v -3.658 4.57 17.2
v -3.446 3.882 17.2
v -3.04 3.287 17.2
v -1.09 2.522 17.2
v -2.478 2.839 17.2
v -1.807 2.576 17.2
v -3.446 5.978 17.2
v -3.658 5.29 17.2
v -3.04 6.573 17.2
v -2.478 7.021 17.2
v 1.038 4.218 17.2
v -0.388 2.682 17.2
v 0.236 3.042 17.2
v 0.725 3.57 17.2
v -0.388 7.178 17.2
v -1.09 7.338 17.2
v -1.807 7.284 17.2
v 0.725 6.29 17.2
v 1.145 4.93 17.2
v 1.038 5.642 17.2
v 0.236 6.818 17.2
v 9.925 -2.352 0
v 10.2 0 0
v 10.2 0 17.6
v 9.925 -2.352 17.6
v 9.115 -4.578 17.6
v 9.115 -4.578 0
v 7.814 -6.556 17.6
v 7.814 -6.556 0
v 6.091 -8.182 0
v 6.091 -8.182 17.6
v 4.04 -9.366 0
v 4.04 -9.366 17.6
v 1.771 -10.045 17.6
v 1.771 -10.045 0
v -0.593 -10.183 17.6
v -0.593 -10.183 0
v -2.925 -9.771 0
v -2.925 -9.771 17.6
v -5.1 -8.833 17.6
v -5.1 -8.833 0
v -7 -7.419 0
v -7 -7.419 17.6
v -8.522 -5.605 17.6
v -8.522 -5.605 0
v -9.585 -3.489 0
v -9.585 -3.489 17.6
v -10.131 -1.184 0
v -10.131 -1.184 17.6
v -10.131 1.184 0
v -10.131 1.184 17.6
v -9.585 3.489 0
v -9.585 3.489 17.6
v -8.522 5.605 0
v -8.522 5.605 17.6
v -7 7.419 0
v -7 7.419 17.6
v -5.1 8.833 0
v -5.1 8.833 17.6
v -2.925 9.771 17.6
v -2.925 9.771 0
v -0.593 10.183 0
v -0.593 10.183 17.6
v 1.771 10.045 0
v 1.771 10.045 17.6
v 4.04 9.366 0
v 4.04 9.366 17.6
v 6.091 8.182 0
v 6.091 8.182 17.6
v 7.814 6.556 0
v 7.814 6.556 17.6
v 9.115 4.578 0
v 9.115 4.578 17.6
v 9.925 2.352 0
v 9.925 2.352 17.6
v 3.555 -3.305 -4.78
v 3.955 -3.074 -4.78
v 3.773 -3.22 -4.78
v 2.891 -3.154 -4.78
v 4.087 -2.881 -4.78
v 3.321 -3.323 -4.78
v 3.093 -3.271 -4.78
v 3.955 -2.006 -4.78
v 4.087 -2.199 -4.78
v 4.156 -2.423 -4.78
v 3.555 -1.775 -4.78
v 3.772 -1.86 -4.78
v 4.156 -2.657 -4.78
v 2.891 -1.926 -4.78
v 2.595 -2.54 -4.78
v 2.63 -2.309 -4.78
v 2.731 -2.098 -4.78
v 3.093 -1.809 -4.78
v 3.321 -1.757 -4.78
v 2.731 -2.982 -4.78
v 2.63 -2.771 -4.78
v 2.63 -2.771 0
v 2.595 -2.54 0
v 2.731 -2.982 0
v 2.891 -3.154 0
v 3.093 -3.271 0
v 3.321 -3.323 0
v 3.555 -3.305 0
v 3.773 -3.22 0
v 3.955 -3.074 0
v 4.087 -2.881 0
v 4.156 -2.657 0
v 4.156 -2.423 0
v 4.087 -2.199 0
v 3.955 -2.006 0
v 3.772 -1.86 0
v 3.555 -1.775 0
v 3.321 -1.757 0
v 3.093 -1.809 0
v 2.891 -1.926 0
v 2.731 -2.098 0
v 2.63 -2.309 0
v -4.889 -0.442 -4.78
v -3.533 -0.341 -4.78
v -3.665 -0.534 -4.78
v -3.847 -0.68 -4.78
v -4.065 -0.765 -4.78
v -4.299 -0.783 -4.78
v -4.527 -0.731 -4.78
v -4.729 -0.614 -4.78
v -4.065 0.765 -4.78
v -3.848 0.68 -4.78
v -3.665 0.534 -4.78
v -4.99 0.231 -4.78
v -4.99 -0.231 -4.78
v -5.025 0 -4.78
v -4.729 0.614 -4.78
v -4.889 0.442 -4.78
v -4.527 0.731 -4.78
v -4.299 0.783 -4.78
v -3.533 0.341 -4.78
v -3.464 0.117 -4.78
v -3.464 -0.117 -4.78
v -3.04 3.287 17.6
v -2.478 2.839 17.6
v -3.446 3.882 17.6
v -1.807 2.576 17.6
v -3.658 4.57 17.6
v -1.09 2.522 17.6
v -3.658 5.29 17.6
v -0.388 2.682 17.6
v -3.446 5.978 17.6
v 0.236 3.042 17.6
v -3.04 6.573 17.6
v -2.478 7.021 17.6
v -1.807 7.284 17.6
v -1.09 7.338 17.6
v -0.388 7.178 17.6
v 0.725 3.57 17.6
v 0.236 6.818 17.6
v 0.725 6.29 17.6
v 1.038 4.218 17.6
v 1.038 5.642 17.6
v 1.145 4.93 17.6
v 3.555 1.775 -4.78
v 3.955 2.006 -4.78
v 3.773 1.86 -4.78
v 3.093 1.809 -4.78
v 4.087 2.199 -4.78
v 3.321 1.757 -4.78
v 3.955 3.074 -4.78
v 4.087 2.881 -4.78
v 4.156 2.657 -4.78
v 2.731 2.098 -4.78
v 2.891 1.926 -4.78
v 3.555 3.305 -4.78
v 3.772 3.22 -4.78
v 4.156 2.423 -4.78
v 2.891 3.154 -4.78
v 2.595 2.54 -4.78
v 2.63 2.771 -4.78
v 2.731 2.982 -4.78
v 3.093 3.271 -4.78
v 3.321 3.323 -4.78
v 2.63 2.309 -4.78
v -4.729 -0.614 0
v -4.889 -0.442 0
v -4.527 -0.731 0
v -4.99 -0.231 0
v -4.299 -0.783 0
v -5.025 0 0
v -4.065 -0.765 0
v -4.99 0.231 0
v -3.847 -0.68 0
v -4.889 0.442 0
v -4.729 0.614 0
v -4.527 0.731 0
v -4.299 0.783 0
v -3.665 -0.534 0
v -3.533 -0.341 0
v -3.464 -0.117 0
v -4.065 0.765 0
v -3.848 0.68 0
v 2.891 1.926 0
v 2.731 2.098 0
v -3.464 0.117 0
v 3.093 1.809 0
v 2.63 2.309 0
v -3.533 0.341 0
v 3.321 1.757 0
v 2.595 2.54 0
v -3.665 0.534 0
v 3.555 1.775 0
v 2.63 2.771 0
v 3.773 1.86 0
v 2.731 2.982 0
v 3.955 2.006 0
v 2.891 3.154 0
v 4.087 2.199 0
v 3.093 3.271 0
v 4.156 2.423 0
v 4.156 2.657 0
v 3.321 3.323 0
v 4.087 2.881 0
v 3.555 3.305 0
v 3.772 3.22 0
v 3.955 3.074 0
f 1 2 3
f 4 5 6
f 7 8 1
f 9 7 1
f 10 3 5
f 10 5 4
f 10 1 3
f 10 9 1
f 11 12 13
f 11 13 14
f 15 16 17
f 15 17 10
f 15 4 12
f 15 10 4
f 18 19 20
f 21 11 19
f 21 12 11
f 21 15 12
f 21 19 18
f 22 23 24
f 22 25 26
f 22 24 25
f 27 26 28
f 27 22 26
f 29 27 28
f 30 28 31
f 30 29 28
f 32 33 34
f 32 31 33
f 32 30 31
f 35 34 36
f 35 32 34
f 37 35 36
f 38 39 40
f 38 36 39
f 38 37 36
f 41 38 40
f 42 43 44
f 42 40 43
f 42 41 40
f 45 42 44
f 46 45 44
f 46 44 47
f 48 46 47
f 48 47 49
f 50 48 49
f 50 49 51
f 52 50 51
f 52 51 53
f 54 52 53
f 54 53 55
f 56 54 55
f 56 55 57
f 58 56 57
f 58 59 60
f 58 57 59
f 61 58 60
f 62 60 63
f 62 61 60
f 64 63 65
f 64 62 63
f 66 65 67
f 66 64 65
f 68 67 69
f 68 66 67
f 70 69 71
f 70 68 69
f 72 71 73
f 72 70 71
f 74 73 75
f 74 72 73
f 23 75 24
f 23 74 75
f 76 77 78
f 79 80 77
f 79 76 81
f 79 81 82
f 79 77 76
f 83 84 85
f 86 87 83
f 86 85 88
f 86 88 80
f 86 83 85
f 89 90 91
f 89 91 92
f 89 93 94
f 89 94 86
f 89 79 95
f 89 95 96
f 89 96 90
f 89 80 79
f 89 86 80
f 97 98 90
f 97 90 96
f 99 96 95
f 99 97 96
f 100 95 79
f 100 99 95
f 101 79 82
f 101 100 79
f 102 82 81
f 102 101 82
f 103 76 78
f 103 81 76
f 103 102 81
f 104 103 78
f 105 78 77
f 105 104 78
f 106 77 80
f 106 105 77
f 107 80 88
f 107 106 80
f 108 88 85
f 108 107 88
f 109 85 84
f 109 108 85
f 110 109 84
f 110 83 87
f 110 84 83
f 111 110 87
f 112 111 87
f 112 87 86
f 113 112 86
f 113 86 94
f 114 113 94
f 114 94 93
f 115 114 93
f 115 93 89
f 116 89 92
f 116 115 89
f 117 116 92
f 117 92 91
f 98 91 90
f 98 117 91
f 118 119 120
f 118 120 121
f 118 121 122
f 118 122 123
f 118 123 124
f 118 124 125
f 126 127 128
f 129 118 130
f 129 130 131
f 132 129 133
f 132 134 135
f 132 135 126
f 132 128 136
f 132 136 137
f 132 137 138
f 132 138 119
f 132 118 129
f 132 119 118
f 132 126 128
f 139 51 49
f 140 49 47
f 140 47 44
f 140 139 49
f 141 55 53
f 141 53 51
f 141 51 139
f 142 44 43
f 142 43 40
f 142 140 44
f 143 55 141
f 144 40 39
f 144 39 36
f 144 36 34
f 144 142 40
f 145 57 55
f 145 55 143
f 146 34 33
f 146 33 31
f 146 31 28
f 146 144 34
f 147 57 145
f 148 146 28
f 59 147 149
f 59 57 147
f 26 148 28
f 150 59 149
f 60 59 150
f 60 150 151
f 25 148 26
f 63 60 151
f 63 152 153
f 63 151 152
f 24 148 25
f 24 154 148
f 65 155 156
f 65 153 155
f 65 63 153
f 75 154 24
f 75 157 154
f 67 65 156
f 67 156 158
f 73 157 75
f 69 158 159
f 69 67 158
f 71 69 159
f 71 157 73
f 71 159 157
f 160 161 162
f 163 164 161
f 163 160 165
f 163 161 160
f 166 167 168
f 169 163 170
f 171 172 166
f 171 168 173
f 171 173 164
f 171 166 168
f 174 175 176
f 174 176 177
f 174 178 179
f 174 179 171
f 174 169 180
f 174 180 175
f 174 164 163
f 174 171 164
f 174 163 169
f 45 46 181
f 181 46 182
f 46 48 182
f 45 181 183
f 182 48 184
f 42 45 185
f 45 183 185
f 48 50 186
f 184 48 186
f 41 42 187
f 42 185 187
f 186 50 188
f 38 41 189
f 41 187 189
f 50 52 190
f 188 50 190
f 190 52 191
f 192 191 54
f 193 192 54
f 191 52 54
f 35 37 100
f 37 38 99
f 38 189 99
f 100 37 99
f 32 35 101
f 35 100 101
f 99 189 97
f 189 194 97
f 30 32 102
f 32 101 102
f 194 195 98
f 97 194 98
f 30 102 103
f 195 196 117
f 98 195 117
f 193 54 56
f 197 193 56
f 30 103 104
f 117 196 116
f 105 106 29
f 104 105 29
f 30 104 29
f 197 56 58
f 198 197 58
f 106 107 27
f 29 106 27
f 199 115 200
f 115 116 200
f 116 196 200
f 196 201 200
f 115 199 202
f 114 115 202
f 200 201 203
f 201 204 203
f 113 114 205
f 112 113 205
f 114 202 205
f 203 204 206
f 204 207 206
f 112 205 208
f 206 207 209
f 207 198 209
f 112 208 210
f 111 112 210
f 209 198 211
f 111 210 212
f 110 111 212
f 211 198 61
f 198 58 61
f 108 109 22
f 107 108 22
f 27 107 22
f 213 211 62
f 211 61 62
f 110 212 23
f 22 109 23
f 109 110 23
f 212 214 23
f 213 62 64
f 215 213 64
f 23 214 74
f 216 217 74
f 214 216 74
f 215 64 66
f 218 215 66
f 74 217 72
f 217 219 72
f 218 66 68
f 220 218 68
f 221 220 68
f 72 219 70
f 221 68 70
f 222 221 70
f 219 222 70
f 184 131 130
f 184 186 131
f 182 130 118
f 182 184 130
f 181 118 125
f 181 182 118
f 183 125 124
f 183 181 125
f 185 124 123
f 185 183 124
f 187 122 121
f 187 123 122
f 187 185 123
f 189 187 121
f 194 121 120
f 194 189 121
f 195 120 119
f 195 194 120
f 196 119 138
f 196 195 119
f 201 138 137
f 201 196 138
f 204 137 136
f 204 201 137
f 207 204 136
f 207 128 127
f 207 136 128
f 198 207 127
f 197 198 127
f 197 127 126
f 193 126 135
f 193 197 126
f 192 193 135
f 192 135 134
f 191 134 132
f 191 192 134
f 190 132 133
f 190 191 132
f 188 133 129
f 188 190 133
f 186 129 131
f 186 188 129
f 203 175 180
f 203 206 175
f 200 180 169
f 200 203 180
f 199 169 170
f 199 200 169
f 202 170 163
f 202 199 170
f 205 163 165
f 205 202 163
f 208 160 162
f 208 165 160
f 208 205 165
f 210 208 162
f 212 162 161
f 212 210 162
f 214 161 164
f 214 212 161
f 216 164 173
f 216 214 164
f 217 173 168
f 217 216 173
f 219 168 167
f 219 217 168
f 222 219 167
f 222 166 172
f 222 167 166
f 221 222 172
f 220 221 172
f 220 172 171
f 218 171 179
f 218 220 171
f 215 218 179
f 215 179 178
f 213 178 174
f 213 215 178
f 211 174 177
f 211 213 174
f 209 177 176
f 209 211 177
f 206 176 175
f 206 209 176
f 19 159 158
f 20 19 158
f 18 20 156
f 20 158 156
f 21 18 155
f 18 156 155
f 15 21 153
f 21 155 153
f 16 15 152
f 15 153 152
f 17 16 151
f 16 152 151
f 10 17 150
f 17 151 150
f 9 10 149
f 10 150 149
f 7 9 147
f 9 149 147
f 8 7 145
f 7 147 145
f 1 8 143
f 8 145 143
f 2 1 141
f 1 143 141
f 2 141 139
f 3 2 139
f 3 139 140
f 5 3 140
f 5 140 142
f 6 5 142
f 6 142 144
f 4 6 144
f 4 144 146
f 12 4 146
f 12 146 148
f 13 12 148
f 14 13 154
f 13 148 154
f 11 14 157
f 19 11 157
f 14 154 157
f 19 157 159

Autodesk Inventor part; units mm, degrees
ref_plane "YZ Plane" through (0, 0, 0) normal (1, 0, 0) x (0, 1, 0)
ref_plane "XZ Plane" through (0, 0, 0) normal (0, 1, 0) x (-1, 0, 0)
ref_plane "XY Plane" through (0, 0, 0) normal (0, 0, 1) x (1, 0, 0)
sketch "Sketch1" plane through (0, 0, 0) normal (0, 0, 1) x (1, 0, 0)
  circle A0 centre (0, 0) radius 10.2
  dimension "pidTechPlusDia" = 20.4
extrude "Extrusion1" add sketch "Sketch1" along normal blind 17.6
sketch "Sketch2" plane through (0, 0, 17.6) normal (0, 0, 1) x (1, 0, 0)
  circle A0 centre (0, 0) radius 10.2 projected
  line L0 (0, 0) -> (-1.27, 0) construction
  line L1 (-1.27, 0) -> (-1.27, 4.93) construction
  line L2 (-1.27, 4.93) -> (0, 4.93) construction
  line L3 (0, 4.93) -> (0, 0) construction
  circle A1 centre (-1.27, 4.93) radius 2.415
  dimension "d3" = 1.27
  dimension "d4" = 4.93
  dimension "d5" = 4.83
extrude "Extrusion2" cut sketch "Sketch2" against normal blind 0.4 contours A1
sketch "Sketch3" plane through (0, 0, 0) normal (0, 0, -1) x (-1, 0, 0)
  circle A0 centre (0, 0) radius 10.2 projected
  circle A1 centre (1.27, 4.93) radius 2.415 projected
  circle A2 centre (1.27, 4.93) radius 2.415 projected
  line L0 (0, 10.2) -> (0, -10.2) construction
  line L1 (-10.2, 0) -> (10.2, 0) construction
  circle A3 centre (4.24, 0) radius 0.785
  circle A4 centre (-3.38, 2.54) radius 0.785
  circle A5 centre (-3.38, -2.54) radius 0.785
  dimension "d8" = 4.24
  dimension "pinDia" = 1.57
  dimension "d10" = 7.62
  dimension "d11" = 5.08
extrude "Extrusion3" add sketch "Sketch3" along normal blind 4.78 contours A3 | A4 | A5
properties part number "pidtech plus"
